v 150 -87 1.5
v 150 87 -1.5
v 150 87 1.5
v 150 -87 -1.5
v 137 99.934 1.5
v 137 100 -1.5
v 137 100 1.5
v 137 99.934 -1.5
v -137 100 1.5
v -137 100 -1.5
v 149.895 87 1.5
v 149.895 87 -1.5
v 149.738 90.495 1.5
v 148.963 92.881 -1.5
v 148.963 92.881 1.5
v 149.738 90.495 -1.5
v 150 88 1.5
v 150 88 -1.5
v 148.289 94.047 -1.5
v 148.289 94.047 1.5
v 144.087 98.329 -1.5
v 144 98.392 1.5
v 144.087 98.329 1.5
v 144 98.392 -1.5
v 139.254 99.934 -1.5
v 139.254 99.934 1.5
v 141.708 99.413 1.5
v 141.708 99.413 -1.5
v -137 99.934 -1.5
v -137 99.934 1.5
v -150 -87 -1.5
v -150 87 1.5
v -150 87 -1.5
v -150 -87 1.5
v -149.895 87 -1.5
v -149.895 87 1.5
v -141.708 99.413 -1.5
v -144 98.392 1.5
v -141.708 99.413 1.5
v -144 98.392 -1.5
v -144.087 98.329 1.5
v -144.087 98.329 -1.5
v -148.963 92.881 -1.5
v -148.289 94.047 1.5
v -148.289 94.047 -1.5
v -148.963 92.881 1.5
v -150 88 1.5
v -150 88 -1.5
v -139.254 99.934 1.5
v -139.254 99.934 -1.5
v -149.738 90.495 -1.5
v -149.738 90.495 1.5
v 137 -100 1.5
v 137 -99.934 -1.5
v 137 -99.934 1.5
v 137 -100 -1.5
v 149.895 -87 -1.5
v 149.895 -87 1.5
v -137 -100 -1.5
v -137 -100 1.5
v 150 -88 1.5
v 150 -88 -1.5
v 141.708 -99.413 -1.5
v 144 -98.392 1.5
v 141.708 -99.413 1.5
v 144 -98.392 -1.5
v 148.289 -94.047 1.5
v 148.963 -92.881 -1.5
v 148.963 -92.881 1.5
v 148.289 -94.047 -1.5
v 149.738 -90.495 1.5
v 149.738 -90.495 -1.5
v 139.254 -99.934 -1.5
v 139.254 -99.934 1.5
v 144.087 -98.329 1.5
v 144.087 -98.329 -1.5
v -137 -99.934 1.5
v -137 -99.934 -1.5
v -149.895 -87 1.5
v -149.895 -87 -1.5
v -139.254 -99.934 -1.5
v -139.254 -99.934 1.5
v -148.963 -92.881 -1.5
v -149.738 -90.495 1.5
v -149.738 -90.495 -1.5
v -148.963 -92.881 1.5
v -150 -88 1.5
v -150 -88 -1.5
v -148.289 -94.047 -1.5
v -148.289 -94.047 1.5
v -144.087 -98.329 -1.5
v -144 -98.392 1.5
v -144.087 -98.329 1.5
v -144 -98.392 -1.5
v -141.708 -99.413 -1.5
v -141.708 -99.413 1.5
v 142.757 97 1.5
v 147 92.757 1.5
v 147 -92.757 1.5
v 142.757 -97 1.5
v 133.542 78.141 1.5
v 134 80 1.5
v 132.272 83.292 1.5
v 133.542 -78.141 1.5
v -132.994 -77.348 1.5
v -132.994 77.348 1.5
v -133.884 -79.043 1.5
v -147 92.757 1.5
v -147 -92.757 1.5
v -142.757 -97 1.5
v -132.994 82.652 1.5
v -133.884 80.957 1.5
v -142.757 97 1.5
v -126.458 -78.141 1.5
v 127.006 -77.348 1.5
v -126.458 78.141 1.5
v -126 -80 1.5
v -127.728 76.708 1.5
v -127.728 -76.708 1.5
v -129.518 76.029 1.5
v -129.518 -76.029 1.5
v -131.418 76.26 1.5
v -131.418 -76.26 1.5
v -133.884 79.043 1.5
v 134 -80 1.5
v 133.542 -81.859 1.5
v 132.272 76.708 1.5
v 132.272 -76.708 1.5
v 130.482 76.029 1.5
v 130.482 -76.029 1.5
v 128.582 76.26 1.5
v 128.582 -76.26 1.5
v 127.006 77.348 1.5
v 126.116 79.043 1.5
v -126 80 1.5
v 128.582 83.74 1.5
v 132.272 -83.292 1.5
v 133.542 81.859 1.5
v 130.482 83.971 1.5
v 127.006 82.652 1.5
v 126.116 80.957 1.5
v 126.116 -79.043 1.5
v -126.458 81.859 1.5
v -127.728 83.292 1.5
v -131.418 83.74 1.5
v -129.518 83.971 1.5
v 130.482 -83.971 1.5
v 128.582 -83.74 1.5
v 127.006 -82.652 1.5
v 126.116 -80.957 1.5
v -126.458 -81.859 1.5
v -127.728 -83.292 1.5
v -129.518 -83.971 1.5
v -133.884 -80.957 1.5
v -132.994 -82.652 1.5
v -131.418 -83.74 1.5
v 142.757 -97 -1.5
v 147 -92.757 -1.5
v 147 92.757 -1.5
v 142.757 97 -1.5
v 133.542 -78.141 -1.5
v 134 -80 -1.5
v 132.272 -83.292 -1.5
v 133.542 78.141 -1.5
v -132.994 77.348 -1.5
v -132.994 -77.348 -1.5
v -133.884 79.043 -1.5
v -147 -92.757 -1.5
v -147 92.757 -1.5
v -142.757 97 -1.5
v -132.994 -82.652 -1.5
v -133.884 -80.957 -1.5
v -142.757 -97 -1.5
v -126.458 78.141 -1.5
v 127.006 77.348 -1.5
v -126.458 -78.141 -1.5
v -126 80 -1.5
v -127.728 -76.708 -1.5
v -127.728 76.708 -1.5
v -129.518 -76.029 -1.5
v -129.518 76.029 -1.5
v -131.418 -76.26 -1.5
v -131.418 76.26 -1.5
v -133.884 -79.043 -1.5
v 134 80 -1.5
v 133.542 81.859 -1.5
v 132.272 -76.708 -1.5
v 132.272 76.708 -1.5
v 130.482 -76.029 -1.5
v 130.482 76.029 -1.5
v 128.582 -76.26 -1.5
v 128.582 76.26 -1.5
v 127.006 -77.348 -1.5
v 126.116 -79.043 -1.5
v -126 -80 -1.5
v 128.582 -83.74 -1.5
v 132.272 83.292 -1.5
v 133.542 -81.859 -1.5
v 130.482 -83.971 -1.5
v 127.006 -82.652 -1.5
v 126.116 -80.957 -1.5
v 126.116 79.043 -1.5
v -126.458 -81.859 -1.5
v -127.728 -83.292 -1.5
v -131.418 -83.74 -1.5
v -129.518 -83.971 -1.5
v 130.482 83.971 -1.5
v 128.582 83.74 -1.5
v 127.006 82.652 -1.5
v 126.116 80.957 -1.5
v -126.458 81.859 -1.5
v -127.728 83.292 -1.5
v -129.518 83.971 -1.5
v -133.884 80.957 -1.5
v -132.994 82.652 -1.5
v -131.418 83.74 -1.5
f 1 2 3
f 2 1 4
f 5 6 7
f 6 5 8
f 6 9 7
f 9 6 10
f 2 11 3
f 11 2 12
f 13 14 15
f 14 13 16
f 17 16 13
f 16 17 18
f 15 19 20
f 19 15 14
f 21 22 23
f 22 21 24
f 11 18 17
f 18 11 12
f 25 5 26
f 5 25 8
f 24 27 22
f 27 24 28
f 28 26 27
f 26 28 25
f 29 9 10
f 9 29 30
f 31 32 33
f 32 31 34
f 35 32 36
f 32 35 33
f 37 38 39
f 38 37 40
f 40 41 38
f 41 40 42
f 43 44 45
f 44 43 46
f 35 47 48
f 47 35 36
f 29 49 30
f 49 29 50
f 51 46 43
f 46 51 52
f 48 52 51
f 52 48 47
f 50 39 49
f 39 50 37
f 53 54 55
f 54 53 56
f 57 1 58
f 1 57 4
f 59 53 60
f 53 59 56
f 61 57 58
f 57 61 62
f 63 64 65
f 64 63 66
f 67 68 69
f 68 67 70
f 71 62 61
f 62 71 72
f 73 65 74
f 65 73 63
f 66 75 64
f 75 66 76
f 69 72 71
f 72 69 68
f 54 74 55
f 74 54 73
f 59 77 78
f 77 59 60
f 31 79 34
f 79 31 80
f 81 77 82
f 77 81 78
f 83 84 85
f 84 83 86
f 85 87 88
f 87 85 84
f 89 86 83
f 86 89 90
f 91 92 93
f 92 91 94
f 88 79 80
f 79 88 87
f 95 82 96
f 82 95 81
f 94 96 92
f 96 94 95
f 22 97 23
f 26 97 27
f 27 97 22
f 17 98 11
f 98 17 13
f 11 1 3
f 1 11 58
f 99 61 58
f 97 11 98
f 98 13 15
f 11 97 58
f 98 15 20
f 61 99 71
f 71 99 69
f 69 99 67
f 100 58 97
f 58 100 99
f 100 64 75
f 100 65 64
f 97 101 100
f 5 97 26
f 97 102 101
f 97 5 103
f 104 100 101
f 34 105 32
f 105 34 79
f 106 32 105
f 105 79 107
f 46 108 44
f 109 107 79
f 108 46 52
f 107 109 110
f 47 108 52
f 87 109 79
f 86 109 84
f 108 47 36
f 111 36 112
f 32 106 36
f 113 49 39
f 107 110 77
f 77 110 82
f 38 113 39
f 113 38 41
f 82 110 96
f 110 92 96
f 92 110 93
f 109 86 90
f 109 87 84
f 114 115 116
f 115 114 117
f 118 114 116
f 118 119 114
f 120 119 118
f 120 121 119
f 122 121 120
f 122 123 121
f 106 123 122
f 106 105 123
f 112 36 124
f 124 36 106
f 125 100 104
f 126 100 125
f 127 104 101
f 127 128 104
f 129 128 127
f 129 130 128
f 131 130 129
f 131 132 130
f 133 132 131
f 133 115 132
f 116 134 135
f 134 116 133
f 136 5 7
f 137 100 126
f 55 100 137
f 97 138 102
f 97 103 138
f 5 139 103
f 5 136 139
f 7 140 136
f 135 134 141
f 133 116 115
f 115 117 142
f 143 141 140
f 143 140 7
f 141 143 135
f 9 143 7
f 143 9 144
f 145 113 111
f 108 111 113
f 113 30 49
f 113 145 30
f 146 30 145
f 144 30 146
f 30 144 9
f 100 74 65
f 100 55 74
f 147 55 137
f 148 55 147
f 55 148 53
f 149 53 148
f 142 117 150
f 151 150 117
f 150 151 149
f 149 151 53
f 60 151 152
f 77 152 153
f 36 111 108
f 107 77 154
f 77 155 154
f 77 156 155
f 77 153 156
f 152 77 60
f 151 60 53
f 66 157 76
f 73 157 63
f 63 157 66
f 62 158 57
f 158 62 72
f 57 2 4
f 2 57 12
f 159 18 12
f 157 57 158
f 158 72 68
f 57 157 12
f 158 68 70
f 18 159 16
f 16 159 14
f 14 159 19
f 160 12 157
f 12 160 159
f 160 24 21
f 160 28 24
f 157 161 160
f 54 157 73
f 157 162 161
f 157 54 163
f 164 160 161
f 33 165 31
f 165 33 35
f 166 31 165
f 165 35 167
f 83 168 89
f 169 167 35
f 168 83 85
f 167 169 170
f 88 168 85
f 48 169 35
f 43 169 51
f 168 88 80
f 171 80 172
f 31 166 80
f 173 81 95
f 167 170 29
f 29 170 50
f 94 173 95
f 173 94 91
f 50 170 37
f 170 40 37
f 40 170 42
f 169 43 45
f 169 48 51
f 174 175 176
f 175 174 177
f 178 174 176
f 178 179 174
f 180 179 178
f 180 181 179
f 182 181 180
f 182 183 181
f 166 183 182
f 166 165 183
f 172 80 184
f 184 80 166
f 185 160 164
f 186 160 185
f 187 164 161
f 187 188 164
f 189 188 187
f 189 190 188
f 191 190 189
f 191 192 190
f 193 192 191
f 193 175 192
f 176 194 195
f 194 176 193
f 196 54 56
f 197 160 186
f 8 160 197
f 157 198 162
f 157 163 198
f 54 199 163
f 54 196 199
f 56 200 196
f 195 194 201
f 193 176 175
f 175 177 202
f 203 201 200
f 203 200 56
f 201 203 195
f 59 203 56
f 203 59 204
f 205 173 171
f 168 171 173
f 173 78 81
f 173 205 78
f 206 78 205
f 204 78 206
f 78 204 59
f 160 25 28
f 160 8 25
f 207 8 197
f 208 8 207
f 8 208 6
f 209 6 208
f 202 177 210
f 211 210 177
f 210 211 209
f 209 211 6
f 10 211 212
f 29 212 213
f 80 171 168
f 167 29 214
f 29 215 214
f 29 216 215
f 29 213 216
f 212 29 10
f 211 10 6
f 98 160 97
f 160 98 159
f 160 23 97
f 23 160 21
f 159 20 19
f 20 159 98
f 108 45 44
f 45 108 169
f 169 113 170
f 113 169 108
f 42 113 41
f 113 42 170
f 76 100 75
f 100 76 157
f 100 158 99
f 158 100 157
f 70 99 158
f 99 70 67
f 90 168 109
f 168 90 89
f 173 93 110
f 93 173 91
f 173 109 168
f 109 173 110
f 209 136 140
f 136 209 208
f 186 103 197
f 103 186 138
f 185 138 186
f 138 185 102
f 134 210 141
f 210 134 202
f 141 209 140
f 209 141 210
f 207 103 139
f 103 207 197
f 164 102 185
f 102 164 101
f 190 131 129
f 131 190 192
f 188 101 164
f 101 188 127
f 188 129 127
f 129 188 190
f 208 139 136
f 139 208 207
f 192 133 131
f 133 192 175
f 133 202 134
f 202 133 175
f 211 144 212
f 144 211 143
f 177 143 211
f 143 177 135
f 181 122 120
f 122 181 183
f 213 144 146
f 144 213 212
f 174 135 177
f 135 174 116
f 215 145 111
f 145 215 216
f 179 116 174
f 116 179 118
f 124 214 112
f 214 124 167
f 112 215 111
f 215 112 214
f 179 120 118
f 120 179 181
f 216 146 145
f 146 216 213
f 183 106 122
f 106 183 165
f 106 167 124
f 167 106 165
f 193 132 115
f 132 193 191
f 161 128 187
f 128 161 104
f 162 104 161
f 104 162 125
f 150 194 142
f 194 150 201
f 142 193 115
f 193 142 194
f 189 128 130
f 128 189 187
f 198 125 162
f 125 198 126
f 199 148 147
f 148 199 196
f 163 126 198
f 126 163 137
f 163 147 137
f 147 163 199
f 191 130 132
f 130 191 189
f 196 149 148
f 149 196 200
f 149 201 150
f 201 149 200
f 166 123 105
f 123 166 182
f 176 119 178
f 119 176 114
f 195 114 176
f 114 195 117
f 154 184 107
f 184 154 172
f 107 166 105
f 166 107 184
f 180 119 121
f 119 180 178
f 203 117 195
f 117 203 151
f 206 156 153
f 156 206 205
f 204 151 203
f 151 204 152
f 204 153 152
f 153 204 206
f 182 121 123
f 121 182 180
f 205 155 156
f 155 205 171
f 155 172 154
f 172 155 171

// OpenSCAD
// Parameters
sheet_length = 300; //[150:600:1]
sheet_width = 200; //[100:400:1]
sheet_thickness = 3; //[1.5:6:0.5]
corner_radius = 12; //[6:24:1]
chamfer_size = 6; //[3:12:1]
hole_diameter = 8; //[4:16:1]
hole_edge_offset = 20; //[10:40:1]
cut_overlap = 1; //[0.5:2:0.5]

// Base Shapes
module sheet_body() {
  translate([0, 0, 0])
    cube([sheet_length, sheet_width, sheet_thickness], center=true);
}

module rounded_corner_cutter(position) {
  translate(position)
    cylinder(r=corner_radius, h=sheet_thickness + 2*cut_overlap, center=true);
}

module rounded_corner_square(position) {
  translate(position)
    cube([corner_radius + cut_overlap, corner_radius + cut_overlap, sheet_thickness + 2*cut_overlap], center=true);
}

module chamfer_cutter(position) {
  translate(position)
    rotate([0, 0, 45])
      cube([chamfer_size, chamfer_size, sheet_thickness + 2*cut_overlap], center=true);
}

module mounting_hole(position) {
  translate(position)
    cylinder(r=hole_diameter/2, h=sheet_thickness + 2*cut_overlap, center=true);
}

// Operations
module rounded_corners() {
  union() {
    difference() {
      rounded_corner_square([sheet_length/2 - (corner_radius + cut_overlap)/2, sheet_width/2 - (corner_radius + cut_overlap)/2, 0]);
      rounded_corner_cutter([sheet_length/2 - corner_radius, sheet_width/2 - corner_radius, 0]);
    }
    difference() {
      rounded_corner_square([-sheet_length/2 + (corner_radius + cut_overlap)/2, sheet_width/2 - (corner_radius + cut_overlap)/2, 0]);
      rounded_corner_cutter([-sheet_length/2 + corner_radius, sheet_width/2 - corner_radius, 0]);
    }
    difference() {
      rounded_corner_square([sheet_length/2 - (corner_radius + cut_overlap)/2, -sheet_width/2 + (corner_radius + cut_overlap)/2, 0]);
      rounded_corner_cutter([sheet_length/2 - corner_radius, -sheet_width/2 + corner_radius, 0]);
    }
    difference() {
      rounded_corner_square([-sheet_length/2 + (corner_radius + cut_overlap)/2, -sheet_width/2 + (corner_radius + cut_overlap)/2, 0]);
      rounded_corner_cutter([-sheet_length/2 + corner_radius, -sheet_width/2 + corner_radius, 0]);
    }
  }
}

module corner_chamfers() {
  union() {
    chamfer_cutter([sheet_length/2 - chamfer_size/2, sheet_width/2 - chamfer_size/2, 0]);
    chamfer_cutter([-sheet_length/2 + chamfer_size/2, sheet_width/2 - chamfer_size/2, 0]);
    chamfer_cutter([sheet_length/2 - chamfer_size/2, -sheet_width/2 + chamfer_size/2, 0]);
    chamfer_cutter([-sheet_length/2 + chamfer_size/2, -sheet_width/2 + chamfer_size/2, 0]);
  }
}

module mounting_holes() {
  union() {
    mounting_hole([sheet_length/2 - hole_edge_offset, sheet_width/2 - hole_edge_offset, 0]);
    mounting_hole([-sheet_length/2 + hole_edge_offset, sheet_width/2 - hole_edge_offset, 0]);
    mounting_hole([sheet_length/2 - hole_edge_offset, -sheet_width/2 + hole_edge_offset, 0]);
    mounting_hole([-sheet_length/2 + hole_edge_offset, -sheet_width/2 + hole_edge_offset, 0]);
  }
}

// Final Model
module complete_model() {
  difference() {
    difference() {
      difference() {
        sheet_body();
        rounded_corners();
      }
      corner_chamfers();
    }
    mounting_holes();
  }
}

// Render the complete model
color("DimGray") complete_model();
